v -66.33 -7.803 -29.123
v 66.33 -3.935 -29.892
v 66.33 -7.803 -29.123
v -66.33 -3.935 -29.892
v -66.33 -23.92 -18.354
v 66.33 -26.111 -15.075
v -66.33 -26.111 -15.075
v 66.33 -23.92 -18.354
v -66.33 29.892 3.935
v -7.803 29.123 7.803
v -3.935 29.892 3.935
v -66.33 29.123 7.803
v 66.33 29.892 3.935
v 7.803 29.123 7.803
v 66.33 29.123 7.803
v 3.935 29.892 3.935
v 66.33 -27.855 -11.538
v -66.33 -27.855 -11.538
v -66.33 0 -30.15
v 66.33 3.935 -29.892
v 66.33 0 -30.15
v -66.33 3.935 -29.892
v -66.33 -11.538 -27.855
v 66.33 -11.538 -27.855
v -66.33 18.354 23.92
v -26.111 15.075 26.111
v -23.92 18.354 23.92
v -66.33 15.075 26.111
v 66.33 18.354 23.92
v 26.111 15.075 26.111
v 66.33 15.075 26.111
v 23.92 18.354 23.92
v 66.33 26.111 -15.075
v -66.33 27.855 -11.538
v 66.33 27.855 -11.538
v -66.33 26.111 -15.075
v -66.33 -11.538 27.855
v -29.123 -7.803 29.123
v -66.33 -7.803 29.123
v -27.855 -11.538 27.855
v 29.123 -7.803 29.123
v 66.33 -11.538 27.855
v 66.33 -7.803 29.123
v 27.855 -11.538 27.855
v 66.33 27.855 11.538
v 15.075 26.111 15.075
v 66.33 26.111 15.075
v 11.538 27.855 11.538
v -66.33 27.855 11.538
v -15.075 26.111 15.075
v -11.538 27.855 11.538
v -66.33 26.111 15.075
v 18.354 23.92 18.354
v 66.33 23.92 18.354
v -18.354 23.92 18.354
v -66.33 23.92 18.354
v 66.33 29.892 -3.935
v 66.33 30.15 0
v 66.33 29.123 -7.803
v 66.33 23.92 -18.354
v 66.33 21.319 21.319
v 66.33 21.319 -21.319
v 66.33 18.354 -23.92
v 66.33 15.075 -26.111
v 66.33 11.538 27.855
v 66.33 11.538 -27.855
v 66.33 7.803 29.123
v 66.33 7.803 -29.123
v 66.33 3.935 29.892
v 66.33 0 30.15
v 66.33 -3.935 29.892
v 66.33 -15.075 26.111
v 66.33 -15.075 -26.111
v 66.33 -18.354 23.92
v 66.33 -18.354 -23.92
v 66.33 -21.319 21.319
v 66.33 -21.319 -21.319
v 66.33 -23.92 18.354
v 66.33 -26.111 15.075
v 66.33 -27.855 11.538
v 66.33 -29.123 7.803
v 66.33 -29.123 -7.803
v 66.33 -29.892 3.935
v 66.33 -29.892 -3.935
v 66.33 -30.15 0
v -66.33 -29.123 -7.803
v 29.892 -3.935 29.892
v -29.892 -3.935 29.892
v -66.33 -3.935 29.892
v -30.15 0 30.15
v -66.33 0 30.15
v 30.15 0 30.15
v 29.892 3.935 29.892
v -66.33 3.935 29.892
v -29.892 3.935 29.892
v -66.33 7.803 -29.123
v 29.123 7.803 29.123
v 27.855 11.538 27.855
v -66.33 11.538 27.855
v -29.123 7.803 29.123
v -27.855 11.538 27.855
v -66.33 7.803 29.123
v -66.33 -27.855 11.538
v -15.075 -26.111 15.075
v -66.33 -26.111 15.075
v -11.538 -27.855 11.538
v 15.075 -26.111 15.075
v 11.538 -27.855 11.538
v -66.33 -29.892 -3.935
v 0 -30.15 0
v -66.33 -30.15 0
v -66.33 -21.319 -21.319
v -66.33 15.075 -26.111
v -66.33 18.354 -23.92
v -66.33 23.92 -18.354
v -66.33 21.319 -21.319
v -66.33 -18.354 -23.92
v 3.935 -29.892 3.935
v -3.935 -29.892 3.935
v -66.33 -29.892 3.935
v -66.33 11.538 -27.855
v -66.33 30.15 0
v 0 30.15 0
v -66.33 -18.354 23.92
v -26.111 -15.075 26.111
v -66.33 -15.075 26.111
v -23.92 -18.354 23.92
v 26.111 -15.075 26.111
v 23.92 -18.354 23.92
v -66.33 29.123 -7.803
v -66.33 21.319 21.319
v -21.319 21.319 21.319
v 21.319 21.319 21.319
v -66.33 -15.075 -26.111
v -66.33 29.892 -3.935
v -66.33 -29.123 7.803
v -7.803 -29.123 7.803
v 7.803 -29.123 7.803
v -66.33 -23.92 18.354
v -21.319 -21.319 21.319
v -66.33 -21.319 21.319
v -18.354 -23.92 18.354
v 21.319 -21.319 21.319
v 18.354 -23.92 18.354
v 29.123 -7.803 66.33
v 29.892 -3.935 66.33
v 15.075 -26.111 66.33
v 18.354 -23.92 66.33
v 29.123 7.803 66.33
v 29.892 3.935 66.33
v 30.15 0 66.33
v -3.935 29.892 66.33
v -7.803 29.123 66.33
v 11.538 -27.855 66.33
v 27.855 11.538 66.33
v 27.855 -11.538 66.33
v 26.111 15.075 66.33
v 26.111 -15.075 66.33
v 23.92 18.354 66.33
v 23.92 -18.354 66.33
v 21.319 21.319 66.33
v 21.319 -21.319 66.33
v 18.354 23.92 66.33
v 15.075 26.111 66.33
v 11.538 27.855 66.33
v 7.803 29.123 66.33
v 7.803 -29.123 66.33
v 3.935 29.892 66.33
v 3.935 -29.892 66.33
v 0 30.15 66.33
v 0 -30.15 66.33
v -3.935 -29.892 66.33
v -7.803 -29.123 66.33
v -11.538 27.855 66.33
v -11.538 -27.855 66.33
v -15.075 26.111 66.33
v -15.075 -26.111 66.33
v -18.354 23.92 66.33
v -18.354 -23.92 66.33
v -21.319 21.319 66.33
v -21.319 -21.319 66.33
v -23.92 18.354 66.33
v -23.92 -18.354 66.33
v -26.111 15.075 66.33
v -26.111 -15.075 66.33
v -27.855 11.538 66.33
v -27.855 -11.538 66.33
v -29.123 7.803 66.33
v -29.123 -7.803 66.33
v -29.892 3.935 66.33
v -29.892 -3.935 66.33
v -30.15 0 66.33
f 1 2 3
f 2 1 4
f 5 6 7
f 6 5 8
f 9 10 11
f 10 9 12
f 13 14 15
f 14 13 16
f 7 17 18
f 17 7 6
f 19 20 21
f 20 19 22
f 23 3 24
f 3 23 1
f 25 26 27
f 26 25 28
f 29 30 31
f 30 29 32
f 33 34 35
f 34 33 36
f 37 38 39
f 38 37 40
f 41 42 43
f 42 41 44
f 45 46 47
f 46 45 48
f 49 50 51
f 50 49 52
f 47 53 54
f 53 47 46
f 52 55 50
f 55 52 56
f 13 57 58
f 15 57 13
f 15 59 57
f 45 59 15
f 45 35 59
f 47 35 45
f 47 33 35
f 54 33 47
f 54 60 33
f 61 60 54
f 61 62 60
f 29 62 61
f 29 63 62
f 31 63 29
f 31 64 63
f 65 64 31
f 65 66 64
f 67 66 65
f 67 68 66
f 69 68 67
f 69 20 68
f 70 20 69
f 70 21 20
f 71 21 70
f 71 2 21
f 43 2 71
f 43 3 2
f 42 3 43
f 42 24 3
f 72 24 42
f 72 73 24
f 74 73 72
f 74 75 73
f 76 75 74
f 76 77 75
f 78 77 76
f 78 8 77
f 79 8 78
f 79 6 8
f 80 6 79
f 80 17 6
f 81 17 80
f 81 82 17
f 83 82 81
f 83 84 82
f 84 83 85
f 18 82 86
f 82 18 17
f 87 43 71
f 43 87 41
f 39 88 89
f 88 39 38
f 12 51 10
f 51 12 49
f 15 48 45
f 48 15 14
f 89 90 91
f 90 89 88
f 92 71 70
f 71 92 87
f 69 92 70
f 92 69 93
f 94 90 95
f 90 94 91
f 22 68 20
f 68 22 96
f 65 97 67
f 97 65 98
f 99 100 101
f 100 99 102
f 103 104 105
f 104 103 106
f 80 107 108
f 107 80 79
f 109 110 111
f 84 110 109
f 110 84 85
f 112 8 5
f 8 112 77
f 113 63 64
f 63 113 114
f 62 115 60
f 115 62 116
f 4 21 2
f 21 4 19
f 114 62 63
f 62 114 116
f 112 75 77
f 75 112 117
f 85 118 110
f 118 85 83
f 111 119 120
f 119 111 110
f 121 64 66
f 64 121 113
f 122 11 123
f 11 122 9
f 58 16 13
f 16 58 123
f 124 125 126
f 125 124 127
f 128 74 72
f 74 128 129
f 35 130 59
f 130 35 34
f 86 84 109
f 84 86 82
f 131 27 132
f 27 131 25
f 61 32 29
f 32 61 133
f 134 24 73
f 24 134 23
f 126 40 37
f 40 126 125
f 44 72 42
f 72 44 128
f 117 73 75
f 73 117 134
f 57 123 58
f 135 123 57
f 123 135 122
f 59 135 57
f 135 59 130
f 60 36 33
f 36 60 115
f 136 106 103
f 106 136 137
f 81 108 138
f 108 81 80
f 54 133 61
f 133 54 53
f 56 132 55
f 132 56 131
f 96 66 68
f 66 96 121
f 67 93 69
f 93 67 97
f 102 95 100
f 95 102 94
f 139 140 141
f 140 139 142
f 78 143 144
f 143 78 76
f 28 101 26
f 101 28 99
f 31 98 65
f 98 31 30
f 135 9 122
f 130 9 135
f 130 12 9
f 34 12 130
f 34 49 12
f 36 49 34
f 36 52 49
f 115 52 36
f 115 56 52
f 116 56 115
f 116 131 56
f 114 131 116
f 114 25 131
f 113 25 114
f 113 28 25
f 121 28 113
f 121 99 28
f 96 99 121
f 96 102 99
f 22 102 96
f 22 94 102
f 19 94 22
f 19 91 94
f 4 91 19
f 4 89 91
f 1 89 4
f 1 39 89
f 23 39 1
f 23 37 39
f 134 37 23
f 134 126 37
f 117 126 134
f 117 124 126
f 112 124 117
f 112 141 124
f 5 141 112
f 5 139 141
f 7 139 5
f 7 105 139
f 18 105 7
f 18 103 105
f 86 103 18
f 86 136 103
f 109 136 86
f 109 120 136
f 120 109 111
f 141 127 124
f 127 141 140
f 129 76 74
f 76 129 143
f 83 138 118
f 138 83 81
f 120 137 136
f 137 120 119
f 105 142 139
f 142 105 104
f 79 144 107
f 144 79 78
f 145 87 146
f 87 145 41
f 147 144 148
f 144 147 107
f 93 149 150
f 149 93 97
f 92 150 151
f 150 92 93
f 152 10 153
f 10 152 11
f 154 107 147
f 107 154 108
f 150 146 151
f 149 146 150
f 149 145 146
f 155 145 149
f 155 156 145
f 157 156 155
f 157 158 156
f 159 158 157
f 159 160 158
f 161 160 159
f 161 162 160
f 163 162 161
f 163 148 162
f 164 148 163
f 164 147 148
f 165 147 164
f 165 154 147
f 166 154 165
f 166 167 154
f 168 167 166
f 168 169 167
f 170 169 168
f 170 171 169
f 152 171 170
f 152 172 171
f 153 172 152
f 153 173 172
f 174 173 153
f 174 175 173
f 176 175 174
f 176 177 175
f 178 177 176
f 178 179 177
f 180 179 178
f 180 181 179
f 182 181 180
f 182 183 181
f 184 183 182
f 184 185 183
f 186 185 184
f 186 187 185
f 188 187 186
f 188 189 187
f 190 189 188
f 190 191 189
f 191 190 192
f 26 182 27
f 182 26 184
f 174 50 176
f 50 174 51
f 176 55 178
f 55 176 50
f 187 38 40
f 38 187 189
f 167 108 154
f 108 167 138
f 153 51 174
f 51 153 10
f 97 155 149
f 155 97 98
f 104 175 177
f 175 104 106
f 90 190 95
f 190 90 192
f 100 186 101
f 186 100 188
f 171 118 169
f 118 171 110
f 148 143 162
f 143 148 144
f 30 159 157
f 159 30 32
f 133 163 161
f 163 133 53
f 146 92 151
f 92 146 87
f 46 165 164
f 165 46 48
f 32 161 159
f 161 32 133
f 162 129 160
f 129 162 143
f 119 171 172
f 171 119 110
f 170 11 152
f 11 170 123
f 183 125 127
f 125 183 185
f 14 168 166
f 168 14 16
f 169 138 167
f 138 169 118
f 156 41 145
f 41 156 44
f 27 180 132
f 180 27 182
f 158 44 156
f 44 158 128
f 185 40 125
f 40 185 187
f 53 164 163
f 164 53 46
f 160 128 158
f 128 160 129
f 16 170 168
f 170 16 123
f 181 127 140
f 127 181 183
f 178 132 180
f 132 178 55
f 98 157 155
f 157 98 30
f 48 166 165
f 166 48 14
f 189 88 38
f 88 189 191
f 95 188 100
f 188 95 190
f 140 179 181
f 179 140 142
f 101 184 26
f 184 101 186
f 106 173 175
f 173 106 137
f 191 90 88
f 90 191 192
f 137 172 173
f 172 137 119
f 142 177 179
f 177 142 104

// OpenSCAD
// Auto-generated by scripts/author_from_manifest.py (Phase D.3).
// Source: data/phase_d_manifest.json (sku_intent='victaulic-no20-tee-grooved-2in').
// Do not hand-edit — regenerate from the manifest.
//
// @part victaulic_no20_tee_grooved_2in
// @kind fitting
// @category fitting.tee
// @display-name "Victaulic No. 20 Grooved Tee 2\""
// @mfg victaulic
// @mfg-pn No._20_2in
// @listing UL FM
// @price-usd 60.00
// @install-minutes 6
// @crew journeyman
// @param size_in number default=2 label="Size" unit="in"
// @port run_in position=[-0.05,0,0] direction=[-1,0,0] style=grooved size_in=2 role=run_a
// @port run_out position=[0.05,0,0] direction=[1,0,0] style=grooved size_in=2 role=run_b
// @port branch position=[0,0,0.05] direction=[0,0,1] style=grooved size_in=2 role=branch

size_in = 2.0;

function od_mm(nps) =
    nps ==   1  ? 33.4 :
    nps == 1.25 ? 42.2 :
    nps == 1.5  ? 48.3 :
    nps ==   2  ? 60.3 :
    nps == 2.5  ? 73.0 :
    nps ==   3  ? 88.9 :
    nps ==   4  ? 114.3 :
    nps ==   5  ? 141.3 :
    nps ==   6  ? 168.3 :
    nps ==   8  ? 219.1 :
    nps ==  10  ? 273.0 : 60.3;

od = od_mm(size_in);
run_len    = od * 2.2;
branch_len = od * 1.1;

union() {
    // Run along X
    rotate([0, 90, 0])
        cylinder(h = run_len, d = od, center = true, $fn = 48);
    // Branch along +Z
    translate([0, 0, branch_len/2])
        cylinder(h = branch_len, d = od, center = true, $fn = 48);
}
